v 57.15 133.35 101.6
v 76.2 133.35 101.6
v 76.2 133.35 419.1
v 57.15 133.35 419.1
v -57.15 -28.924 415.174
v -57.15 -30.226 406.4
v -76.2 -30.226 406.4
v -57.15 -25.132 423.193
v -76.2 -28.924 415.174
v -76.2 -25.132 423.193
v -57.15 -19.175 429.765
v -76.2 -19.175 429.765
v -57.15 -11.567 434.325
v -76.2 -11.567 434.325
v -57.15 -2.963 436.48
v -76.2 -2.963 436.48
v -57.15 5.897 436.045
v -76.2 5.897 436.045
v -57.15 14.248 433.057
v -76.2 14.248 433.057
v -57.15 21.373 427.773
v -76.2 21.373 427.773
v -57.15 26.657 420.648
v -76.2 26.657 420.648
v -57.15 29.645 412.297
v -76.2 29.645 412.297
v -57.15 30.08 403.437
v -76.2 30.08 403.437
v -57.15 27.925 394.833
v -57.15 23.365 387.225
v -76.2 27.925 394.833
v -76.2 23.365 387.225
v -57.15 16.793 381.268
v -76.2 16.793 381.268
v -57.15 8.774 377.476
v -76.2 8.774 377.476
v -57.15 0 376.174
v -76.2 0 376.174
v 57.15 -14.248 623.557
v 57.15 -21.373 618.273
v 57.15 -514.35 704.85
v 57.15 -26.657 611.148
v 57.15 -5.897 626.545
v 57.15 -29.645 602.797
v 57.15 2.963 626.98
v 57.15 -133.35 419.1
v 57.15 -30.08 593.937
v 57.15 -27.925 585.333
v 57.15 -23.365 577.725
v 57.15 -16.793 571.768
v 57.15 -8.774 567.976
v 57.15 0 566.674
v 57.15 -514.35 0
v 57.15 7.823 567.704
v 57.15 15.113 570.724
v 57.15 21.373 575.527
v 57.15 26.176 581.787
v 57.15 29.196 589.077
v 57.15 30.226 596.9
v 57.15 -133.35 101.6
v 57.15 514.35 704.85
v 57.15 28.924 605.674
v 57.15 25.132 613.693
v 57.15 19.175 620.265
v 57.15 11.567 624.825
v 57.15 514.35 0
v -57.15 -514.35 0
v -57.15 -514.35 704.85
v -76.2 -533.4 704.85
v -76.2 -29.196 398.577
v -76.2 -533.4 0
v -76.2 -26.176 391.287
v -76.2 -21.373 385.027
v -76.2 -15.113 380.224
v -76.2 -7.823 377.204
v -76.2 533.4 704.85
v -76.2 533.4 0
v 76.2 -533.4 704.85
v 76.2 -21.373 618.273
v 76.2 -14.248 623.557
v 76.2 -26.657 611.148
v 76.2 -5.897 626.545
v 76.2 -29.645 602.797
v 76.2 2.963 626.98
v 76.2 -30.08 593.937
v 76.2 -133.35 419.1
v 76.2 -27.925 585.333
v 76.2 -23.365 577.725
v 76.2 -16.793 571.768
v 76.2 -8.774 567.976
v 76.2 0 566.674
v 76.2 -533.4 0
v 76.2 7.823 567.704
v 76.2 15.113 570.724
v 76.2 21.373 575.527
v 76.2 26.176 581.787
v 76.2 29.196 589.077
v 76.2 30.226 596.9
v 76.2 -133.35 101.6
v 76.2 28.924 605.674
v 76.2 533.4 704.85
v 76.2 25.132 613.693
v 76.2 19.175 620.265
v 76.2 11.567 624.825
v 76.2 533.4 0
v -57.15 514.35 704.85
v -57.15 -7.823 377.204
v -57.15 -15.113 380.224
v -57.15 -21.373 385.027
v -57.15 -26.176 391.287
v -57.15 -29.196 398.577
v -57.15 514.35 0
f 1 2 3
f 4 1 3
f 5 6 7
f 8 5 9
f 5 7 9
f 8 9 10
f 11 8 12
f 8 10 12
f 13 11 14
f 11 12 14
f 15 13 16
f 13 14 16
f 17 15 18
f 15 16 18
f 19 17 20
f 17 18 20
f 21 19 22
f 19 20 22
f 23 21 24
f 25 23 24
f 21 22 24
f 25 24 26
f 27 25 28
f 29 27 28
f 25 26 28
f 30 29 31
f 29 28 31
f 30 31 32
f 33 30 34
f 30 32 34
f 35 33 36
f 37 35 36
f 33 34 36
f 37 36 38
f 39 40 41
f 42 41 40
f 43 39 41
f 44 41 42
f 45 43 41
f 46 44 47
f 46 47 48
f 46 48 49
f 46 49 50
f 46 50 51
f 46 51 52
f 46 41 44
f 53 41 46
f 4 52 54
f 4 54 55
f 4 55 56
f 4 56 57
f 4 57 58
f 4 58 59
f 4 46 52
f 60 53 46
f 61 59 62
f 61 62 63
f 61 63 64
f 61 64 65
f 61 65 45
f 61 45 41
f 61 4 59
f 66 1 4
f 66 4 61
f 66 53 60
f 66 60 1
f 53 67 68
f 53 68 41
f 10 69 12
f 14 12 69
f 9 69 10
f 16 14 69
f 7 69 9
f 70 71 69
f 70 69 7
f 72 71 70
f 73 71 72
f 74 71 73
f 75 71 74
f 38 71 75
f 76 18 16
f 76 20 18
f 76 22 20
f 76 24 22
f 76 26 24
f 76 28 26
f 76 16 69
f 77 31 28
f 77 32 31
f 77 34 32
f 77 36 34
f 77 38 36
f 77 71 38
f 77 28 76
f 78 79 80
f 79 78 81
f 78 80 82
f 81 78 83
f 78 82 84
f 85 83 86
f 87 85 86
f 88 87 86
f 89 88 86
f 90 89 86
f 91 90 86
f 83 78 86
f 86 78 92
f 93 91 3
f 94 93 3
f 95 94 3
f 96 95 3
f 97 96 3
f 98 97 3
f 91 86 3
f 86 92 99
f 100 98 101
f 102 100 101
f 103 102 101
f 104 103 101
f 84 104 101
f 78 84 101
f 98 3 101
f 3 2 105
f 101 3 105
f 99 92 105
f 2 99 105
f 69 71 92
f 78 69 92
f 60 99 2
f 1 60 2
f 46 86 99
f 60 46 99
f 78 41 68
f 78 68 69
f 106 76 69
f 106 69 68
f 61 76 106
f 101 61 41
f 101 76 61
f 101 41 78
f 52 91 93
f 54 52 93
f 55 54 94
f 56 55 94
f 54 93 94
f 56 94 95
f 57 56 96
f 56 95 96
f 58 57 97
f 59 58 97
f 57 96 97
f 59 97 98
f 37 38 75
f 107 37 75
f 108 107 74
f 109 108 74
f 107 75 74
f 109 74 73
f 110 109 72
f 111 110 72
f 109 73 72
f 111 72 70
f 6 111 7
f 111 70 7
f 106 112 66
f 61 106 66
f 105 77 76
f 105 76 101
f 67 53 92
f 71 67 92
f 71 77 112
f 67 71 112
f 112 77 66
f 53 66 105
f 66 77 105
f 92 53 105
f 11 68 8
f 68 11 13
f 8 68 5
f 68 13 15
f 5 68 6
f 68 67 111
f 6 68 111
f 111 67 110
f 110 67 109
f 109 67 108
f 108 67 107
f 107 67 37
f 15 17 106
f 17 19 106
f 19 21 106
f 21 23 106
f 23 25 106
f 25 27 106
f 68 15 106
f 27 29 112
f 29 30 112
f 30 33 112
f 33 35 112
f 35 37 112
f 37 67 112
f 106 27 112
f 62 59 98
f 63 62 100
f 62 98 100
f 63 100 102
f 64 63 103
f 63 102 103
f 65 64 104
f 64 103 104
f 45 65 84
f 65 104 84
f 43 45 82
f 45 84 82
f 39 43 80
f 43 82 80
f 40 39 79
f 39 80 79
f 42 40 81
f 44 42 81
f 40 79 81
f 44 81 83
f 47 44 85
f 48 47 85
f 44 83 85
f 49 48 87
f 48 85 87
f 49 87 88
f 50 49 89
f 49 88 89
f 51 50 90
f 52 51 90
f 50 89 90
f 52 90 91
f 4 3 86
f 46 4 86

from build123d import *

# Parameters (mm, degrees)
F0_W     = 152.4
F0_H     = 1066.8
F0_W_2   = 114.3
F0_H_2   = 1028.7
F1_DEPTH = 704.85
F3_DEPTH = 25.4
F5_DEPTH = 25.4


# Not quite as in the source:
# - a feature names something its author has since deleted; it is built from what else it names


with BuildPart() as f1:
    # F0 (on Top) → F1 (new body)
    with BuildSketch(Plane.XY):
        Rectangle(F0_W, F0_H)
        Rectangle(F0_W_2, F0_H_2, mode=Mode.SUBTRACT)
    extrude(amount=F1_DEPTH)

    # F2 (on face) → F3 (cut)
    with BuildSketch(Plane.YZ.offset(76.2)):
        with BuildLine():
            ThreePointArc((30.226, 596.9), (-21.3730095681, 618.2730095681), (0, 566.674))
            ThreePointArc((0, 566.674), (21.3730095681, 575.5269904319), (30.226, 596.9))
        make_face()
        Polygon((-133.35, 101.6), (0, 101.6), (133.35, 101.6), (133.35, 419.1), (0, 419.1), (-133.35, 419.1), align=None)
    extrude(amount=-F3_DEPTH, mode=Mode.SUBTRACT)

    # F4 (on face) → F5 (cut)
    with BuildSketch(Plane(origin=(-76.2, 0, 0), x_dir=(0, -1, 0), z_dir=(-1, 0, 0))):
        with BuildLine():
            ThreePointArc((30.226, 406.4), (-21.3730095681, 427.7730095681), (0, 376.174))
            ThreePointArc((0, 376.174), (21.3730095681, 385.0269904319), (30.226, 406.4))
        make_face()
    extrude(amount=-F5_DEPTH, mode=Mode.SUBTRACT)


solid = f1.part
